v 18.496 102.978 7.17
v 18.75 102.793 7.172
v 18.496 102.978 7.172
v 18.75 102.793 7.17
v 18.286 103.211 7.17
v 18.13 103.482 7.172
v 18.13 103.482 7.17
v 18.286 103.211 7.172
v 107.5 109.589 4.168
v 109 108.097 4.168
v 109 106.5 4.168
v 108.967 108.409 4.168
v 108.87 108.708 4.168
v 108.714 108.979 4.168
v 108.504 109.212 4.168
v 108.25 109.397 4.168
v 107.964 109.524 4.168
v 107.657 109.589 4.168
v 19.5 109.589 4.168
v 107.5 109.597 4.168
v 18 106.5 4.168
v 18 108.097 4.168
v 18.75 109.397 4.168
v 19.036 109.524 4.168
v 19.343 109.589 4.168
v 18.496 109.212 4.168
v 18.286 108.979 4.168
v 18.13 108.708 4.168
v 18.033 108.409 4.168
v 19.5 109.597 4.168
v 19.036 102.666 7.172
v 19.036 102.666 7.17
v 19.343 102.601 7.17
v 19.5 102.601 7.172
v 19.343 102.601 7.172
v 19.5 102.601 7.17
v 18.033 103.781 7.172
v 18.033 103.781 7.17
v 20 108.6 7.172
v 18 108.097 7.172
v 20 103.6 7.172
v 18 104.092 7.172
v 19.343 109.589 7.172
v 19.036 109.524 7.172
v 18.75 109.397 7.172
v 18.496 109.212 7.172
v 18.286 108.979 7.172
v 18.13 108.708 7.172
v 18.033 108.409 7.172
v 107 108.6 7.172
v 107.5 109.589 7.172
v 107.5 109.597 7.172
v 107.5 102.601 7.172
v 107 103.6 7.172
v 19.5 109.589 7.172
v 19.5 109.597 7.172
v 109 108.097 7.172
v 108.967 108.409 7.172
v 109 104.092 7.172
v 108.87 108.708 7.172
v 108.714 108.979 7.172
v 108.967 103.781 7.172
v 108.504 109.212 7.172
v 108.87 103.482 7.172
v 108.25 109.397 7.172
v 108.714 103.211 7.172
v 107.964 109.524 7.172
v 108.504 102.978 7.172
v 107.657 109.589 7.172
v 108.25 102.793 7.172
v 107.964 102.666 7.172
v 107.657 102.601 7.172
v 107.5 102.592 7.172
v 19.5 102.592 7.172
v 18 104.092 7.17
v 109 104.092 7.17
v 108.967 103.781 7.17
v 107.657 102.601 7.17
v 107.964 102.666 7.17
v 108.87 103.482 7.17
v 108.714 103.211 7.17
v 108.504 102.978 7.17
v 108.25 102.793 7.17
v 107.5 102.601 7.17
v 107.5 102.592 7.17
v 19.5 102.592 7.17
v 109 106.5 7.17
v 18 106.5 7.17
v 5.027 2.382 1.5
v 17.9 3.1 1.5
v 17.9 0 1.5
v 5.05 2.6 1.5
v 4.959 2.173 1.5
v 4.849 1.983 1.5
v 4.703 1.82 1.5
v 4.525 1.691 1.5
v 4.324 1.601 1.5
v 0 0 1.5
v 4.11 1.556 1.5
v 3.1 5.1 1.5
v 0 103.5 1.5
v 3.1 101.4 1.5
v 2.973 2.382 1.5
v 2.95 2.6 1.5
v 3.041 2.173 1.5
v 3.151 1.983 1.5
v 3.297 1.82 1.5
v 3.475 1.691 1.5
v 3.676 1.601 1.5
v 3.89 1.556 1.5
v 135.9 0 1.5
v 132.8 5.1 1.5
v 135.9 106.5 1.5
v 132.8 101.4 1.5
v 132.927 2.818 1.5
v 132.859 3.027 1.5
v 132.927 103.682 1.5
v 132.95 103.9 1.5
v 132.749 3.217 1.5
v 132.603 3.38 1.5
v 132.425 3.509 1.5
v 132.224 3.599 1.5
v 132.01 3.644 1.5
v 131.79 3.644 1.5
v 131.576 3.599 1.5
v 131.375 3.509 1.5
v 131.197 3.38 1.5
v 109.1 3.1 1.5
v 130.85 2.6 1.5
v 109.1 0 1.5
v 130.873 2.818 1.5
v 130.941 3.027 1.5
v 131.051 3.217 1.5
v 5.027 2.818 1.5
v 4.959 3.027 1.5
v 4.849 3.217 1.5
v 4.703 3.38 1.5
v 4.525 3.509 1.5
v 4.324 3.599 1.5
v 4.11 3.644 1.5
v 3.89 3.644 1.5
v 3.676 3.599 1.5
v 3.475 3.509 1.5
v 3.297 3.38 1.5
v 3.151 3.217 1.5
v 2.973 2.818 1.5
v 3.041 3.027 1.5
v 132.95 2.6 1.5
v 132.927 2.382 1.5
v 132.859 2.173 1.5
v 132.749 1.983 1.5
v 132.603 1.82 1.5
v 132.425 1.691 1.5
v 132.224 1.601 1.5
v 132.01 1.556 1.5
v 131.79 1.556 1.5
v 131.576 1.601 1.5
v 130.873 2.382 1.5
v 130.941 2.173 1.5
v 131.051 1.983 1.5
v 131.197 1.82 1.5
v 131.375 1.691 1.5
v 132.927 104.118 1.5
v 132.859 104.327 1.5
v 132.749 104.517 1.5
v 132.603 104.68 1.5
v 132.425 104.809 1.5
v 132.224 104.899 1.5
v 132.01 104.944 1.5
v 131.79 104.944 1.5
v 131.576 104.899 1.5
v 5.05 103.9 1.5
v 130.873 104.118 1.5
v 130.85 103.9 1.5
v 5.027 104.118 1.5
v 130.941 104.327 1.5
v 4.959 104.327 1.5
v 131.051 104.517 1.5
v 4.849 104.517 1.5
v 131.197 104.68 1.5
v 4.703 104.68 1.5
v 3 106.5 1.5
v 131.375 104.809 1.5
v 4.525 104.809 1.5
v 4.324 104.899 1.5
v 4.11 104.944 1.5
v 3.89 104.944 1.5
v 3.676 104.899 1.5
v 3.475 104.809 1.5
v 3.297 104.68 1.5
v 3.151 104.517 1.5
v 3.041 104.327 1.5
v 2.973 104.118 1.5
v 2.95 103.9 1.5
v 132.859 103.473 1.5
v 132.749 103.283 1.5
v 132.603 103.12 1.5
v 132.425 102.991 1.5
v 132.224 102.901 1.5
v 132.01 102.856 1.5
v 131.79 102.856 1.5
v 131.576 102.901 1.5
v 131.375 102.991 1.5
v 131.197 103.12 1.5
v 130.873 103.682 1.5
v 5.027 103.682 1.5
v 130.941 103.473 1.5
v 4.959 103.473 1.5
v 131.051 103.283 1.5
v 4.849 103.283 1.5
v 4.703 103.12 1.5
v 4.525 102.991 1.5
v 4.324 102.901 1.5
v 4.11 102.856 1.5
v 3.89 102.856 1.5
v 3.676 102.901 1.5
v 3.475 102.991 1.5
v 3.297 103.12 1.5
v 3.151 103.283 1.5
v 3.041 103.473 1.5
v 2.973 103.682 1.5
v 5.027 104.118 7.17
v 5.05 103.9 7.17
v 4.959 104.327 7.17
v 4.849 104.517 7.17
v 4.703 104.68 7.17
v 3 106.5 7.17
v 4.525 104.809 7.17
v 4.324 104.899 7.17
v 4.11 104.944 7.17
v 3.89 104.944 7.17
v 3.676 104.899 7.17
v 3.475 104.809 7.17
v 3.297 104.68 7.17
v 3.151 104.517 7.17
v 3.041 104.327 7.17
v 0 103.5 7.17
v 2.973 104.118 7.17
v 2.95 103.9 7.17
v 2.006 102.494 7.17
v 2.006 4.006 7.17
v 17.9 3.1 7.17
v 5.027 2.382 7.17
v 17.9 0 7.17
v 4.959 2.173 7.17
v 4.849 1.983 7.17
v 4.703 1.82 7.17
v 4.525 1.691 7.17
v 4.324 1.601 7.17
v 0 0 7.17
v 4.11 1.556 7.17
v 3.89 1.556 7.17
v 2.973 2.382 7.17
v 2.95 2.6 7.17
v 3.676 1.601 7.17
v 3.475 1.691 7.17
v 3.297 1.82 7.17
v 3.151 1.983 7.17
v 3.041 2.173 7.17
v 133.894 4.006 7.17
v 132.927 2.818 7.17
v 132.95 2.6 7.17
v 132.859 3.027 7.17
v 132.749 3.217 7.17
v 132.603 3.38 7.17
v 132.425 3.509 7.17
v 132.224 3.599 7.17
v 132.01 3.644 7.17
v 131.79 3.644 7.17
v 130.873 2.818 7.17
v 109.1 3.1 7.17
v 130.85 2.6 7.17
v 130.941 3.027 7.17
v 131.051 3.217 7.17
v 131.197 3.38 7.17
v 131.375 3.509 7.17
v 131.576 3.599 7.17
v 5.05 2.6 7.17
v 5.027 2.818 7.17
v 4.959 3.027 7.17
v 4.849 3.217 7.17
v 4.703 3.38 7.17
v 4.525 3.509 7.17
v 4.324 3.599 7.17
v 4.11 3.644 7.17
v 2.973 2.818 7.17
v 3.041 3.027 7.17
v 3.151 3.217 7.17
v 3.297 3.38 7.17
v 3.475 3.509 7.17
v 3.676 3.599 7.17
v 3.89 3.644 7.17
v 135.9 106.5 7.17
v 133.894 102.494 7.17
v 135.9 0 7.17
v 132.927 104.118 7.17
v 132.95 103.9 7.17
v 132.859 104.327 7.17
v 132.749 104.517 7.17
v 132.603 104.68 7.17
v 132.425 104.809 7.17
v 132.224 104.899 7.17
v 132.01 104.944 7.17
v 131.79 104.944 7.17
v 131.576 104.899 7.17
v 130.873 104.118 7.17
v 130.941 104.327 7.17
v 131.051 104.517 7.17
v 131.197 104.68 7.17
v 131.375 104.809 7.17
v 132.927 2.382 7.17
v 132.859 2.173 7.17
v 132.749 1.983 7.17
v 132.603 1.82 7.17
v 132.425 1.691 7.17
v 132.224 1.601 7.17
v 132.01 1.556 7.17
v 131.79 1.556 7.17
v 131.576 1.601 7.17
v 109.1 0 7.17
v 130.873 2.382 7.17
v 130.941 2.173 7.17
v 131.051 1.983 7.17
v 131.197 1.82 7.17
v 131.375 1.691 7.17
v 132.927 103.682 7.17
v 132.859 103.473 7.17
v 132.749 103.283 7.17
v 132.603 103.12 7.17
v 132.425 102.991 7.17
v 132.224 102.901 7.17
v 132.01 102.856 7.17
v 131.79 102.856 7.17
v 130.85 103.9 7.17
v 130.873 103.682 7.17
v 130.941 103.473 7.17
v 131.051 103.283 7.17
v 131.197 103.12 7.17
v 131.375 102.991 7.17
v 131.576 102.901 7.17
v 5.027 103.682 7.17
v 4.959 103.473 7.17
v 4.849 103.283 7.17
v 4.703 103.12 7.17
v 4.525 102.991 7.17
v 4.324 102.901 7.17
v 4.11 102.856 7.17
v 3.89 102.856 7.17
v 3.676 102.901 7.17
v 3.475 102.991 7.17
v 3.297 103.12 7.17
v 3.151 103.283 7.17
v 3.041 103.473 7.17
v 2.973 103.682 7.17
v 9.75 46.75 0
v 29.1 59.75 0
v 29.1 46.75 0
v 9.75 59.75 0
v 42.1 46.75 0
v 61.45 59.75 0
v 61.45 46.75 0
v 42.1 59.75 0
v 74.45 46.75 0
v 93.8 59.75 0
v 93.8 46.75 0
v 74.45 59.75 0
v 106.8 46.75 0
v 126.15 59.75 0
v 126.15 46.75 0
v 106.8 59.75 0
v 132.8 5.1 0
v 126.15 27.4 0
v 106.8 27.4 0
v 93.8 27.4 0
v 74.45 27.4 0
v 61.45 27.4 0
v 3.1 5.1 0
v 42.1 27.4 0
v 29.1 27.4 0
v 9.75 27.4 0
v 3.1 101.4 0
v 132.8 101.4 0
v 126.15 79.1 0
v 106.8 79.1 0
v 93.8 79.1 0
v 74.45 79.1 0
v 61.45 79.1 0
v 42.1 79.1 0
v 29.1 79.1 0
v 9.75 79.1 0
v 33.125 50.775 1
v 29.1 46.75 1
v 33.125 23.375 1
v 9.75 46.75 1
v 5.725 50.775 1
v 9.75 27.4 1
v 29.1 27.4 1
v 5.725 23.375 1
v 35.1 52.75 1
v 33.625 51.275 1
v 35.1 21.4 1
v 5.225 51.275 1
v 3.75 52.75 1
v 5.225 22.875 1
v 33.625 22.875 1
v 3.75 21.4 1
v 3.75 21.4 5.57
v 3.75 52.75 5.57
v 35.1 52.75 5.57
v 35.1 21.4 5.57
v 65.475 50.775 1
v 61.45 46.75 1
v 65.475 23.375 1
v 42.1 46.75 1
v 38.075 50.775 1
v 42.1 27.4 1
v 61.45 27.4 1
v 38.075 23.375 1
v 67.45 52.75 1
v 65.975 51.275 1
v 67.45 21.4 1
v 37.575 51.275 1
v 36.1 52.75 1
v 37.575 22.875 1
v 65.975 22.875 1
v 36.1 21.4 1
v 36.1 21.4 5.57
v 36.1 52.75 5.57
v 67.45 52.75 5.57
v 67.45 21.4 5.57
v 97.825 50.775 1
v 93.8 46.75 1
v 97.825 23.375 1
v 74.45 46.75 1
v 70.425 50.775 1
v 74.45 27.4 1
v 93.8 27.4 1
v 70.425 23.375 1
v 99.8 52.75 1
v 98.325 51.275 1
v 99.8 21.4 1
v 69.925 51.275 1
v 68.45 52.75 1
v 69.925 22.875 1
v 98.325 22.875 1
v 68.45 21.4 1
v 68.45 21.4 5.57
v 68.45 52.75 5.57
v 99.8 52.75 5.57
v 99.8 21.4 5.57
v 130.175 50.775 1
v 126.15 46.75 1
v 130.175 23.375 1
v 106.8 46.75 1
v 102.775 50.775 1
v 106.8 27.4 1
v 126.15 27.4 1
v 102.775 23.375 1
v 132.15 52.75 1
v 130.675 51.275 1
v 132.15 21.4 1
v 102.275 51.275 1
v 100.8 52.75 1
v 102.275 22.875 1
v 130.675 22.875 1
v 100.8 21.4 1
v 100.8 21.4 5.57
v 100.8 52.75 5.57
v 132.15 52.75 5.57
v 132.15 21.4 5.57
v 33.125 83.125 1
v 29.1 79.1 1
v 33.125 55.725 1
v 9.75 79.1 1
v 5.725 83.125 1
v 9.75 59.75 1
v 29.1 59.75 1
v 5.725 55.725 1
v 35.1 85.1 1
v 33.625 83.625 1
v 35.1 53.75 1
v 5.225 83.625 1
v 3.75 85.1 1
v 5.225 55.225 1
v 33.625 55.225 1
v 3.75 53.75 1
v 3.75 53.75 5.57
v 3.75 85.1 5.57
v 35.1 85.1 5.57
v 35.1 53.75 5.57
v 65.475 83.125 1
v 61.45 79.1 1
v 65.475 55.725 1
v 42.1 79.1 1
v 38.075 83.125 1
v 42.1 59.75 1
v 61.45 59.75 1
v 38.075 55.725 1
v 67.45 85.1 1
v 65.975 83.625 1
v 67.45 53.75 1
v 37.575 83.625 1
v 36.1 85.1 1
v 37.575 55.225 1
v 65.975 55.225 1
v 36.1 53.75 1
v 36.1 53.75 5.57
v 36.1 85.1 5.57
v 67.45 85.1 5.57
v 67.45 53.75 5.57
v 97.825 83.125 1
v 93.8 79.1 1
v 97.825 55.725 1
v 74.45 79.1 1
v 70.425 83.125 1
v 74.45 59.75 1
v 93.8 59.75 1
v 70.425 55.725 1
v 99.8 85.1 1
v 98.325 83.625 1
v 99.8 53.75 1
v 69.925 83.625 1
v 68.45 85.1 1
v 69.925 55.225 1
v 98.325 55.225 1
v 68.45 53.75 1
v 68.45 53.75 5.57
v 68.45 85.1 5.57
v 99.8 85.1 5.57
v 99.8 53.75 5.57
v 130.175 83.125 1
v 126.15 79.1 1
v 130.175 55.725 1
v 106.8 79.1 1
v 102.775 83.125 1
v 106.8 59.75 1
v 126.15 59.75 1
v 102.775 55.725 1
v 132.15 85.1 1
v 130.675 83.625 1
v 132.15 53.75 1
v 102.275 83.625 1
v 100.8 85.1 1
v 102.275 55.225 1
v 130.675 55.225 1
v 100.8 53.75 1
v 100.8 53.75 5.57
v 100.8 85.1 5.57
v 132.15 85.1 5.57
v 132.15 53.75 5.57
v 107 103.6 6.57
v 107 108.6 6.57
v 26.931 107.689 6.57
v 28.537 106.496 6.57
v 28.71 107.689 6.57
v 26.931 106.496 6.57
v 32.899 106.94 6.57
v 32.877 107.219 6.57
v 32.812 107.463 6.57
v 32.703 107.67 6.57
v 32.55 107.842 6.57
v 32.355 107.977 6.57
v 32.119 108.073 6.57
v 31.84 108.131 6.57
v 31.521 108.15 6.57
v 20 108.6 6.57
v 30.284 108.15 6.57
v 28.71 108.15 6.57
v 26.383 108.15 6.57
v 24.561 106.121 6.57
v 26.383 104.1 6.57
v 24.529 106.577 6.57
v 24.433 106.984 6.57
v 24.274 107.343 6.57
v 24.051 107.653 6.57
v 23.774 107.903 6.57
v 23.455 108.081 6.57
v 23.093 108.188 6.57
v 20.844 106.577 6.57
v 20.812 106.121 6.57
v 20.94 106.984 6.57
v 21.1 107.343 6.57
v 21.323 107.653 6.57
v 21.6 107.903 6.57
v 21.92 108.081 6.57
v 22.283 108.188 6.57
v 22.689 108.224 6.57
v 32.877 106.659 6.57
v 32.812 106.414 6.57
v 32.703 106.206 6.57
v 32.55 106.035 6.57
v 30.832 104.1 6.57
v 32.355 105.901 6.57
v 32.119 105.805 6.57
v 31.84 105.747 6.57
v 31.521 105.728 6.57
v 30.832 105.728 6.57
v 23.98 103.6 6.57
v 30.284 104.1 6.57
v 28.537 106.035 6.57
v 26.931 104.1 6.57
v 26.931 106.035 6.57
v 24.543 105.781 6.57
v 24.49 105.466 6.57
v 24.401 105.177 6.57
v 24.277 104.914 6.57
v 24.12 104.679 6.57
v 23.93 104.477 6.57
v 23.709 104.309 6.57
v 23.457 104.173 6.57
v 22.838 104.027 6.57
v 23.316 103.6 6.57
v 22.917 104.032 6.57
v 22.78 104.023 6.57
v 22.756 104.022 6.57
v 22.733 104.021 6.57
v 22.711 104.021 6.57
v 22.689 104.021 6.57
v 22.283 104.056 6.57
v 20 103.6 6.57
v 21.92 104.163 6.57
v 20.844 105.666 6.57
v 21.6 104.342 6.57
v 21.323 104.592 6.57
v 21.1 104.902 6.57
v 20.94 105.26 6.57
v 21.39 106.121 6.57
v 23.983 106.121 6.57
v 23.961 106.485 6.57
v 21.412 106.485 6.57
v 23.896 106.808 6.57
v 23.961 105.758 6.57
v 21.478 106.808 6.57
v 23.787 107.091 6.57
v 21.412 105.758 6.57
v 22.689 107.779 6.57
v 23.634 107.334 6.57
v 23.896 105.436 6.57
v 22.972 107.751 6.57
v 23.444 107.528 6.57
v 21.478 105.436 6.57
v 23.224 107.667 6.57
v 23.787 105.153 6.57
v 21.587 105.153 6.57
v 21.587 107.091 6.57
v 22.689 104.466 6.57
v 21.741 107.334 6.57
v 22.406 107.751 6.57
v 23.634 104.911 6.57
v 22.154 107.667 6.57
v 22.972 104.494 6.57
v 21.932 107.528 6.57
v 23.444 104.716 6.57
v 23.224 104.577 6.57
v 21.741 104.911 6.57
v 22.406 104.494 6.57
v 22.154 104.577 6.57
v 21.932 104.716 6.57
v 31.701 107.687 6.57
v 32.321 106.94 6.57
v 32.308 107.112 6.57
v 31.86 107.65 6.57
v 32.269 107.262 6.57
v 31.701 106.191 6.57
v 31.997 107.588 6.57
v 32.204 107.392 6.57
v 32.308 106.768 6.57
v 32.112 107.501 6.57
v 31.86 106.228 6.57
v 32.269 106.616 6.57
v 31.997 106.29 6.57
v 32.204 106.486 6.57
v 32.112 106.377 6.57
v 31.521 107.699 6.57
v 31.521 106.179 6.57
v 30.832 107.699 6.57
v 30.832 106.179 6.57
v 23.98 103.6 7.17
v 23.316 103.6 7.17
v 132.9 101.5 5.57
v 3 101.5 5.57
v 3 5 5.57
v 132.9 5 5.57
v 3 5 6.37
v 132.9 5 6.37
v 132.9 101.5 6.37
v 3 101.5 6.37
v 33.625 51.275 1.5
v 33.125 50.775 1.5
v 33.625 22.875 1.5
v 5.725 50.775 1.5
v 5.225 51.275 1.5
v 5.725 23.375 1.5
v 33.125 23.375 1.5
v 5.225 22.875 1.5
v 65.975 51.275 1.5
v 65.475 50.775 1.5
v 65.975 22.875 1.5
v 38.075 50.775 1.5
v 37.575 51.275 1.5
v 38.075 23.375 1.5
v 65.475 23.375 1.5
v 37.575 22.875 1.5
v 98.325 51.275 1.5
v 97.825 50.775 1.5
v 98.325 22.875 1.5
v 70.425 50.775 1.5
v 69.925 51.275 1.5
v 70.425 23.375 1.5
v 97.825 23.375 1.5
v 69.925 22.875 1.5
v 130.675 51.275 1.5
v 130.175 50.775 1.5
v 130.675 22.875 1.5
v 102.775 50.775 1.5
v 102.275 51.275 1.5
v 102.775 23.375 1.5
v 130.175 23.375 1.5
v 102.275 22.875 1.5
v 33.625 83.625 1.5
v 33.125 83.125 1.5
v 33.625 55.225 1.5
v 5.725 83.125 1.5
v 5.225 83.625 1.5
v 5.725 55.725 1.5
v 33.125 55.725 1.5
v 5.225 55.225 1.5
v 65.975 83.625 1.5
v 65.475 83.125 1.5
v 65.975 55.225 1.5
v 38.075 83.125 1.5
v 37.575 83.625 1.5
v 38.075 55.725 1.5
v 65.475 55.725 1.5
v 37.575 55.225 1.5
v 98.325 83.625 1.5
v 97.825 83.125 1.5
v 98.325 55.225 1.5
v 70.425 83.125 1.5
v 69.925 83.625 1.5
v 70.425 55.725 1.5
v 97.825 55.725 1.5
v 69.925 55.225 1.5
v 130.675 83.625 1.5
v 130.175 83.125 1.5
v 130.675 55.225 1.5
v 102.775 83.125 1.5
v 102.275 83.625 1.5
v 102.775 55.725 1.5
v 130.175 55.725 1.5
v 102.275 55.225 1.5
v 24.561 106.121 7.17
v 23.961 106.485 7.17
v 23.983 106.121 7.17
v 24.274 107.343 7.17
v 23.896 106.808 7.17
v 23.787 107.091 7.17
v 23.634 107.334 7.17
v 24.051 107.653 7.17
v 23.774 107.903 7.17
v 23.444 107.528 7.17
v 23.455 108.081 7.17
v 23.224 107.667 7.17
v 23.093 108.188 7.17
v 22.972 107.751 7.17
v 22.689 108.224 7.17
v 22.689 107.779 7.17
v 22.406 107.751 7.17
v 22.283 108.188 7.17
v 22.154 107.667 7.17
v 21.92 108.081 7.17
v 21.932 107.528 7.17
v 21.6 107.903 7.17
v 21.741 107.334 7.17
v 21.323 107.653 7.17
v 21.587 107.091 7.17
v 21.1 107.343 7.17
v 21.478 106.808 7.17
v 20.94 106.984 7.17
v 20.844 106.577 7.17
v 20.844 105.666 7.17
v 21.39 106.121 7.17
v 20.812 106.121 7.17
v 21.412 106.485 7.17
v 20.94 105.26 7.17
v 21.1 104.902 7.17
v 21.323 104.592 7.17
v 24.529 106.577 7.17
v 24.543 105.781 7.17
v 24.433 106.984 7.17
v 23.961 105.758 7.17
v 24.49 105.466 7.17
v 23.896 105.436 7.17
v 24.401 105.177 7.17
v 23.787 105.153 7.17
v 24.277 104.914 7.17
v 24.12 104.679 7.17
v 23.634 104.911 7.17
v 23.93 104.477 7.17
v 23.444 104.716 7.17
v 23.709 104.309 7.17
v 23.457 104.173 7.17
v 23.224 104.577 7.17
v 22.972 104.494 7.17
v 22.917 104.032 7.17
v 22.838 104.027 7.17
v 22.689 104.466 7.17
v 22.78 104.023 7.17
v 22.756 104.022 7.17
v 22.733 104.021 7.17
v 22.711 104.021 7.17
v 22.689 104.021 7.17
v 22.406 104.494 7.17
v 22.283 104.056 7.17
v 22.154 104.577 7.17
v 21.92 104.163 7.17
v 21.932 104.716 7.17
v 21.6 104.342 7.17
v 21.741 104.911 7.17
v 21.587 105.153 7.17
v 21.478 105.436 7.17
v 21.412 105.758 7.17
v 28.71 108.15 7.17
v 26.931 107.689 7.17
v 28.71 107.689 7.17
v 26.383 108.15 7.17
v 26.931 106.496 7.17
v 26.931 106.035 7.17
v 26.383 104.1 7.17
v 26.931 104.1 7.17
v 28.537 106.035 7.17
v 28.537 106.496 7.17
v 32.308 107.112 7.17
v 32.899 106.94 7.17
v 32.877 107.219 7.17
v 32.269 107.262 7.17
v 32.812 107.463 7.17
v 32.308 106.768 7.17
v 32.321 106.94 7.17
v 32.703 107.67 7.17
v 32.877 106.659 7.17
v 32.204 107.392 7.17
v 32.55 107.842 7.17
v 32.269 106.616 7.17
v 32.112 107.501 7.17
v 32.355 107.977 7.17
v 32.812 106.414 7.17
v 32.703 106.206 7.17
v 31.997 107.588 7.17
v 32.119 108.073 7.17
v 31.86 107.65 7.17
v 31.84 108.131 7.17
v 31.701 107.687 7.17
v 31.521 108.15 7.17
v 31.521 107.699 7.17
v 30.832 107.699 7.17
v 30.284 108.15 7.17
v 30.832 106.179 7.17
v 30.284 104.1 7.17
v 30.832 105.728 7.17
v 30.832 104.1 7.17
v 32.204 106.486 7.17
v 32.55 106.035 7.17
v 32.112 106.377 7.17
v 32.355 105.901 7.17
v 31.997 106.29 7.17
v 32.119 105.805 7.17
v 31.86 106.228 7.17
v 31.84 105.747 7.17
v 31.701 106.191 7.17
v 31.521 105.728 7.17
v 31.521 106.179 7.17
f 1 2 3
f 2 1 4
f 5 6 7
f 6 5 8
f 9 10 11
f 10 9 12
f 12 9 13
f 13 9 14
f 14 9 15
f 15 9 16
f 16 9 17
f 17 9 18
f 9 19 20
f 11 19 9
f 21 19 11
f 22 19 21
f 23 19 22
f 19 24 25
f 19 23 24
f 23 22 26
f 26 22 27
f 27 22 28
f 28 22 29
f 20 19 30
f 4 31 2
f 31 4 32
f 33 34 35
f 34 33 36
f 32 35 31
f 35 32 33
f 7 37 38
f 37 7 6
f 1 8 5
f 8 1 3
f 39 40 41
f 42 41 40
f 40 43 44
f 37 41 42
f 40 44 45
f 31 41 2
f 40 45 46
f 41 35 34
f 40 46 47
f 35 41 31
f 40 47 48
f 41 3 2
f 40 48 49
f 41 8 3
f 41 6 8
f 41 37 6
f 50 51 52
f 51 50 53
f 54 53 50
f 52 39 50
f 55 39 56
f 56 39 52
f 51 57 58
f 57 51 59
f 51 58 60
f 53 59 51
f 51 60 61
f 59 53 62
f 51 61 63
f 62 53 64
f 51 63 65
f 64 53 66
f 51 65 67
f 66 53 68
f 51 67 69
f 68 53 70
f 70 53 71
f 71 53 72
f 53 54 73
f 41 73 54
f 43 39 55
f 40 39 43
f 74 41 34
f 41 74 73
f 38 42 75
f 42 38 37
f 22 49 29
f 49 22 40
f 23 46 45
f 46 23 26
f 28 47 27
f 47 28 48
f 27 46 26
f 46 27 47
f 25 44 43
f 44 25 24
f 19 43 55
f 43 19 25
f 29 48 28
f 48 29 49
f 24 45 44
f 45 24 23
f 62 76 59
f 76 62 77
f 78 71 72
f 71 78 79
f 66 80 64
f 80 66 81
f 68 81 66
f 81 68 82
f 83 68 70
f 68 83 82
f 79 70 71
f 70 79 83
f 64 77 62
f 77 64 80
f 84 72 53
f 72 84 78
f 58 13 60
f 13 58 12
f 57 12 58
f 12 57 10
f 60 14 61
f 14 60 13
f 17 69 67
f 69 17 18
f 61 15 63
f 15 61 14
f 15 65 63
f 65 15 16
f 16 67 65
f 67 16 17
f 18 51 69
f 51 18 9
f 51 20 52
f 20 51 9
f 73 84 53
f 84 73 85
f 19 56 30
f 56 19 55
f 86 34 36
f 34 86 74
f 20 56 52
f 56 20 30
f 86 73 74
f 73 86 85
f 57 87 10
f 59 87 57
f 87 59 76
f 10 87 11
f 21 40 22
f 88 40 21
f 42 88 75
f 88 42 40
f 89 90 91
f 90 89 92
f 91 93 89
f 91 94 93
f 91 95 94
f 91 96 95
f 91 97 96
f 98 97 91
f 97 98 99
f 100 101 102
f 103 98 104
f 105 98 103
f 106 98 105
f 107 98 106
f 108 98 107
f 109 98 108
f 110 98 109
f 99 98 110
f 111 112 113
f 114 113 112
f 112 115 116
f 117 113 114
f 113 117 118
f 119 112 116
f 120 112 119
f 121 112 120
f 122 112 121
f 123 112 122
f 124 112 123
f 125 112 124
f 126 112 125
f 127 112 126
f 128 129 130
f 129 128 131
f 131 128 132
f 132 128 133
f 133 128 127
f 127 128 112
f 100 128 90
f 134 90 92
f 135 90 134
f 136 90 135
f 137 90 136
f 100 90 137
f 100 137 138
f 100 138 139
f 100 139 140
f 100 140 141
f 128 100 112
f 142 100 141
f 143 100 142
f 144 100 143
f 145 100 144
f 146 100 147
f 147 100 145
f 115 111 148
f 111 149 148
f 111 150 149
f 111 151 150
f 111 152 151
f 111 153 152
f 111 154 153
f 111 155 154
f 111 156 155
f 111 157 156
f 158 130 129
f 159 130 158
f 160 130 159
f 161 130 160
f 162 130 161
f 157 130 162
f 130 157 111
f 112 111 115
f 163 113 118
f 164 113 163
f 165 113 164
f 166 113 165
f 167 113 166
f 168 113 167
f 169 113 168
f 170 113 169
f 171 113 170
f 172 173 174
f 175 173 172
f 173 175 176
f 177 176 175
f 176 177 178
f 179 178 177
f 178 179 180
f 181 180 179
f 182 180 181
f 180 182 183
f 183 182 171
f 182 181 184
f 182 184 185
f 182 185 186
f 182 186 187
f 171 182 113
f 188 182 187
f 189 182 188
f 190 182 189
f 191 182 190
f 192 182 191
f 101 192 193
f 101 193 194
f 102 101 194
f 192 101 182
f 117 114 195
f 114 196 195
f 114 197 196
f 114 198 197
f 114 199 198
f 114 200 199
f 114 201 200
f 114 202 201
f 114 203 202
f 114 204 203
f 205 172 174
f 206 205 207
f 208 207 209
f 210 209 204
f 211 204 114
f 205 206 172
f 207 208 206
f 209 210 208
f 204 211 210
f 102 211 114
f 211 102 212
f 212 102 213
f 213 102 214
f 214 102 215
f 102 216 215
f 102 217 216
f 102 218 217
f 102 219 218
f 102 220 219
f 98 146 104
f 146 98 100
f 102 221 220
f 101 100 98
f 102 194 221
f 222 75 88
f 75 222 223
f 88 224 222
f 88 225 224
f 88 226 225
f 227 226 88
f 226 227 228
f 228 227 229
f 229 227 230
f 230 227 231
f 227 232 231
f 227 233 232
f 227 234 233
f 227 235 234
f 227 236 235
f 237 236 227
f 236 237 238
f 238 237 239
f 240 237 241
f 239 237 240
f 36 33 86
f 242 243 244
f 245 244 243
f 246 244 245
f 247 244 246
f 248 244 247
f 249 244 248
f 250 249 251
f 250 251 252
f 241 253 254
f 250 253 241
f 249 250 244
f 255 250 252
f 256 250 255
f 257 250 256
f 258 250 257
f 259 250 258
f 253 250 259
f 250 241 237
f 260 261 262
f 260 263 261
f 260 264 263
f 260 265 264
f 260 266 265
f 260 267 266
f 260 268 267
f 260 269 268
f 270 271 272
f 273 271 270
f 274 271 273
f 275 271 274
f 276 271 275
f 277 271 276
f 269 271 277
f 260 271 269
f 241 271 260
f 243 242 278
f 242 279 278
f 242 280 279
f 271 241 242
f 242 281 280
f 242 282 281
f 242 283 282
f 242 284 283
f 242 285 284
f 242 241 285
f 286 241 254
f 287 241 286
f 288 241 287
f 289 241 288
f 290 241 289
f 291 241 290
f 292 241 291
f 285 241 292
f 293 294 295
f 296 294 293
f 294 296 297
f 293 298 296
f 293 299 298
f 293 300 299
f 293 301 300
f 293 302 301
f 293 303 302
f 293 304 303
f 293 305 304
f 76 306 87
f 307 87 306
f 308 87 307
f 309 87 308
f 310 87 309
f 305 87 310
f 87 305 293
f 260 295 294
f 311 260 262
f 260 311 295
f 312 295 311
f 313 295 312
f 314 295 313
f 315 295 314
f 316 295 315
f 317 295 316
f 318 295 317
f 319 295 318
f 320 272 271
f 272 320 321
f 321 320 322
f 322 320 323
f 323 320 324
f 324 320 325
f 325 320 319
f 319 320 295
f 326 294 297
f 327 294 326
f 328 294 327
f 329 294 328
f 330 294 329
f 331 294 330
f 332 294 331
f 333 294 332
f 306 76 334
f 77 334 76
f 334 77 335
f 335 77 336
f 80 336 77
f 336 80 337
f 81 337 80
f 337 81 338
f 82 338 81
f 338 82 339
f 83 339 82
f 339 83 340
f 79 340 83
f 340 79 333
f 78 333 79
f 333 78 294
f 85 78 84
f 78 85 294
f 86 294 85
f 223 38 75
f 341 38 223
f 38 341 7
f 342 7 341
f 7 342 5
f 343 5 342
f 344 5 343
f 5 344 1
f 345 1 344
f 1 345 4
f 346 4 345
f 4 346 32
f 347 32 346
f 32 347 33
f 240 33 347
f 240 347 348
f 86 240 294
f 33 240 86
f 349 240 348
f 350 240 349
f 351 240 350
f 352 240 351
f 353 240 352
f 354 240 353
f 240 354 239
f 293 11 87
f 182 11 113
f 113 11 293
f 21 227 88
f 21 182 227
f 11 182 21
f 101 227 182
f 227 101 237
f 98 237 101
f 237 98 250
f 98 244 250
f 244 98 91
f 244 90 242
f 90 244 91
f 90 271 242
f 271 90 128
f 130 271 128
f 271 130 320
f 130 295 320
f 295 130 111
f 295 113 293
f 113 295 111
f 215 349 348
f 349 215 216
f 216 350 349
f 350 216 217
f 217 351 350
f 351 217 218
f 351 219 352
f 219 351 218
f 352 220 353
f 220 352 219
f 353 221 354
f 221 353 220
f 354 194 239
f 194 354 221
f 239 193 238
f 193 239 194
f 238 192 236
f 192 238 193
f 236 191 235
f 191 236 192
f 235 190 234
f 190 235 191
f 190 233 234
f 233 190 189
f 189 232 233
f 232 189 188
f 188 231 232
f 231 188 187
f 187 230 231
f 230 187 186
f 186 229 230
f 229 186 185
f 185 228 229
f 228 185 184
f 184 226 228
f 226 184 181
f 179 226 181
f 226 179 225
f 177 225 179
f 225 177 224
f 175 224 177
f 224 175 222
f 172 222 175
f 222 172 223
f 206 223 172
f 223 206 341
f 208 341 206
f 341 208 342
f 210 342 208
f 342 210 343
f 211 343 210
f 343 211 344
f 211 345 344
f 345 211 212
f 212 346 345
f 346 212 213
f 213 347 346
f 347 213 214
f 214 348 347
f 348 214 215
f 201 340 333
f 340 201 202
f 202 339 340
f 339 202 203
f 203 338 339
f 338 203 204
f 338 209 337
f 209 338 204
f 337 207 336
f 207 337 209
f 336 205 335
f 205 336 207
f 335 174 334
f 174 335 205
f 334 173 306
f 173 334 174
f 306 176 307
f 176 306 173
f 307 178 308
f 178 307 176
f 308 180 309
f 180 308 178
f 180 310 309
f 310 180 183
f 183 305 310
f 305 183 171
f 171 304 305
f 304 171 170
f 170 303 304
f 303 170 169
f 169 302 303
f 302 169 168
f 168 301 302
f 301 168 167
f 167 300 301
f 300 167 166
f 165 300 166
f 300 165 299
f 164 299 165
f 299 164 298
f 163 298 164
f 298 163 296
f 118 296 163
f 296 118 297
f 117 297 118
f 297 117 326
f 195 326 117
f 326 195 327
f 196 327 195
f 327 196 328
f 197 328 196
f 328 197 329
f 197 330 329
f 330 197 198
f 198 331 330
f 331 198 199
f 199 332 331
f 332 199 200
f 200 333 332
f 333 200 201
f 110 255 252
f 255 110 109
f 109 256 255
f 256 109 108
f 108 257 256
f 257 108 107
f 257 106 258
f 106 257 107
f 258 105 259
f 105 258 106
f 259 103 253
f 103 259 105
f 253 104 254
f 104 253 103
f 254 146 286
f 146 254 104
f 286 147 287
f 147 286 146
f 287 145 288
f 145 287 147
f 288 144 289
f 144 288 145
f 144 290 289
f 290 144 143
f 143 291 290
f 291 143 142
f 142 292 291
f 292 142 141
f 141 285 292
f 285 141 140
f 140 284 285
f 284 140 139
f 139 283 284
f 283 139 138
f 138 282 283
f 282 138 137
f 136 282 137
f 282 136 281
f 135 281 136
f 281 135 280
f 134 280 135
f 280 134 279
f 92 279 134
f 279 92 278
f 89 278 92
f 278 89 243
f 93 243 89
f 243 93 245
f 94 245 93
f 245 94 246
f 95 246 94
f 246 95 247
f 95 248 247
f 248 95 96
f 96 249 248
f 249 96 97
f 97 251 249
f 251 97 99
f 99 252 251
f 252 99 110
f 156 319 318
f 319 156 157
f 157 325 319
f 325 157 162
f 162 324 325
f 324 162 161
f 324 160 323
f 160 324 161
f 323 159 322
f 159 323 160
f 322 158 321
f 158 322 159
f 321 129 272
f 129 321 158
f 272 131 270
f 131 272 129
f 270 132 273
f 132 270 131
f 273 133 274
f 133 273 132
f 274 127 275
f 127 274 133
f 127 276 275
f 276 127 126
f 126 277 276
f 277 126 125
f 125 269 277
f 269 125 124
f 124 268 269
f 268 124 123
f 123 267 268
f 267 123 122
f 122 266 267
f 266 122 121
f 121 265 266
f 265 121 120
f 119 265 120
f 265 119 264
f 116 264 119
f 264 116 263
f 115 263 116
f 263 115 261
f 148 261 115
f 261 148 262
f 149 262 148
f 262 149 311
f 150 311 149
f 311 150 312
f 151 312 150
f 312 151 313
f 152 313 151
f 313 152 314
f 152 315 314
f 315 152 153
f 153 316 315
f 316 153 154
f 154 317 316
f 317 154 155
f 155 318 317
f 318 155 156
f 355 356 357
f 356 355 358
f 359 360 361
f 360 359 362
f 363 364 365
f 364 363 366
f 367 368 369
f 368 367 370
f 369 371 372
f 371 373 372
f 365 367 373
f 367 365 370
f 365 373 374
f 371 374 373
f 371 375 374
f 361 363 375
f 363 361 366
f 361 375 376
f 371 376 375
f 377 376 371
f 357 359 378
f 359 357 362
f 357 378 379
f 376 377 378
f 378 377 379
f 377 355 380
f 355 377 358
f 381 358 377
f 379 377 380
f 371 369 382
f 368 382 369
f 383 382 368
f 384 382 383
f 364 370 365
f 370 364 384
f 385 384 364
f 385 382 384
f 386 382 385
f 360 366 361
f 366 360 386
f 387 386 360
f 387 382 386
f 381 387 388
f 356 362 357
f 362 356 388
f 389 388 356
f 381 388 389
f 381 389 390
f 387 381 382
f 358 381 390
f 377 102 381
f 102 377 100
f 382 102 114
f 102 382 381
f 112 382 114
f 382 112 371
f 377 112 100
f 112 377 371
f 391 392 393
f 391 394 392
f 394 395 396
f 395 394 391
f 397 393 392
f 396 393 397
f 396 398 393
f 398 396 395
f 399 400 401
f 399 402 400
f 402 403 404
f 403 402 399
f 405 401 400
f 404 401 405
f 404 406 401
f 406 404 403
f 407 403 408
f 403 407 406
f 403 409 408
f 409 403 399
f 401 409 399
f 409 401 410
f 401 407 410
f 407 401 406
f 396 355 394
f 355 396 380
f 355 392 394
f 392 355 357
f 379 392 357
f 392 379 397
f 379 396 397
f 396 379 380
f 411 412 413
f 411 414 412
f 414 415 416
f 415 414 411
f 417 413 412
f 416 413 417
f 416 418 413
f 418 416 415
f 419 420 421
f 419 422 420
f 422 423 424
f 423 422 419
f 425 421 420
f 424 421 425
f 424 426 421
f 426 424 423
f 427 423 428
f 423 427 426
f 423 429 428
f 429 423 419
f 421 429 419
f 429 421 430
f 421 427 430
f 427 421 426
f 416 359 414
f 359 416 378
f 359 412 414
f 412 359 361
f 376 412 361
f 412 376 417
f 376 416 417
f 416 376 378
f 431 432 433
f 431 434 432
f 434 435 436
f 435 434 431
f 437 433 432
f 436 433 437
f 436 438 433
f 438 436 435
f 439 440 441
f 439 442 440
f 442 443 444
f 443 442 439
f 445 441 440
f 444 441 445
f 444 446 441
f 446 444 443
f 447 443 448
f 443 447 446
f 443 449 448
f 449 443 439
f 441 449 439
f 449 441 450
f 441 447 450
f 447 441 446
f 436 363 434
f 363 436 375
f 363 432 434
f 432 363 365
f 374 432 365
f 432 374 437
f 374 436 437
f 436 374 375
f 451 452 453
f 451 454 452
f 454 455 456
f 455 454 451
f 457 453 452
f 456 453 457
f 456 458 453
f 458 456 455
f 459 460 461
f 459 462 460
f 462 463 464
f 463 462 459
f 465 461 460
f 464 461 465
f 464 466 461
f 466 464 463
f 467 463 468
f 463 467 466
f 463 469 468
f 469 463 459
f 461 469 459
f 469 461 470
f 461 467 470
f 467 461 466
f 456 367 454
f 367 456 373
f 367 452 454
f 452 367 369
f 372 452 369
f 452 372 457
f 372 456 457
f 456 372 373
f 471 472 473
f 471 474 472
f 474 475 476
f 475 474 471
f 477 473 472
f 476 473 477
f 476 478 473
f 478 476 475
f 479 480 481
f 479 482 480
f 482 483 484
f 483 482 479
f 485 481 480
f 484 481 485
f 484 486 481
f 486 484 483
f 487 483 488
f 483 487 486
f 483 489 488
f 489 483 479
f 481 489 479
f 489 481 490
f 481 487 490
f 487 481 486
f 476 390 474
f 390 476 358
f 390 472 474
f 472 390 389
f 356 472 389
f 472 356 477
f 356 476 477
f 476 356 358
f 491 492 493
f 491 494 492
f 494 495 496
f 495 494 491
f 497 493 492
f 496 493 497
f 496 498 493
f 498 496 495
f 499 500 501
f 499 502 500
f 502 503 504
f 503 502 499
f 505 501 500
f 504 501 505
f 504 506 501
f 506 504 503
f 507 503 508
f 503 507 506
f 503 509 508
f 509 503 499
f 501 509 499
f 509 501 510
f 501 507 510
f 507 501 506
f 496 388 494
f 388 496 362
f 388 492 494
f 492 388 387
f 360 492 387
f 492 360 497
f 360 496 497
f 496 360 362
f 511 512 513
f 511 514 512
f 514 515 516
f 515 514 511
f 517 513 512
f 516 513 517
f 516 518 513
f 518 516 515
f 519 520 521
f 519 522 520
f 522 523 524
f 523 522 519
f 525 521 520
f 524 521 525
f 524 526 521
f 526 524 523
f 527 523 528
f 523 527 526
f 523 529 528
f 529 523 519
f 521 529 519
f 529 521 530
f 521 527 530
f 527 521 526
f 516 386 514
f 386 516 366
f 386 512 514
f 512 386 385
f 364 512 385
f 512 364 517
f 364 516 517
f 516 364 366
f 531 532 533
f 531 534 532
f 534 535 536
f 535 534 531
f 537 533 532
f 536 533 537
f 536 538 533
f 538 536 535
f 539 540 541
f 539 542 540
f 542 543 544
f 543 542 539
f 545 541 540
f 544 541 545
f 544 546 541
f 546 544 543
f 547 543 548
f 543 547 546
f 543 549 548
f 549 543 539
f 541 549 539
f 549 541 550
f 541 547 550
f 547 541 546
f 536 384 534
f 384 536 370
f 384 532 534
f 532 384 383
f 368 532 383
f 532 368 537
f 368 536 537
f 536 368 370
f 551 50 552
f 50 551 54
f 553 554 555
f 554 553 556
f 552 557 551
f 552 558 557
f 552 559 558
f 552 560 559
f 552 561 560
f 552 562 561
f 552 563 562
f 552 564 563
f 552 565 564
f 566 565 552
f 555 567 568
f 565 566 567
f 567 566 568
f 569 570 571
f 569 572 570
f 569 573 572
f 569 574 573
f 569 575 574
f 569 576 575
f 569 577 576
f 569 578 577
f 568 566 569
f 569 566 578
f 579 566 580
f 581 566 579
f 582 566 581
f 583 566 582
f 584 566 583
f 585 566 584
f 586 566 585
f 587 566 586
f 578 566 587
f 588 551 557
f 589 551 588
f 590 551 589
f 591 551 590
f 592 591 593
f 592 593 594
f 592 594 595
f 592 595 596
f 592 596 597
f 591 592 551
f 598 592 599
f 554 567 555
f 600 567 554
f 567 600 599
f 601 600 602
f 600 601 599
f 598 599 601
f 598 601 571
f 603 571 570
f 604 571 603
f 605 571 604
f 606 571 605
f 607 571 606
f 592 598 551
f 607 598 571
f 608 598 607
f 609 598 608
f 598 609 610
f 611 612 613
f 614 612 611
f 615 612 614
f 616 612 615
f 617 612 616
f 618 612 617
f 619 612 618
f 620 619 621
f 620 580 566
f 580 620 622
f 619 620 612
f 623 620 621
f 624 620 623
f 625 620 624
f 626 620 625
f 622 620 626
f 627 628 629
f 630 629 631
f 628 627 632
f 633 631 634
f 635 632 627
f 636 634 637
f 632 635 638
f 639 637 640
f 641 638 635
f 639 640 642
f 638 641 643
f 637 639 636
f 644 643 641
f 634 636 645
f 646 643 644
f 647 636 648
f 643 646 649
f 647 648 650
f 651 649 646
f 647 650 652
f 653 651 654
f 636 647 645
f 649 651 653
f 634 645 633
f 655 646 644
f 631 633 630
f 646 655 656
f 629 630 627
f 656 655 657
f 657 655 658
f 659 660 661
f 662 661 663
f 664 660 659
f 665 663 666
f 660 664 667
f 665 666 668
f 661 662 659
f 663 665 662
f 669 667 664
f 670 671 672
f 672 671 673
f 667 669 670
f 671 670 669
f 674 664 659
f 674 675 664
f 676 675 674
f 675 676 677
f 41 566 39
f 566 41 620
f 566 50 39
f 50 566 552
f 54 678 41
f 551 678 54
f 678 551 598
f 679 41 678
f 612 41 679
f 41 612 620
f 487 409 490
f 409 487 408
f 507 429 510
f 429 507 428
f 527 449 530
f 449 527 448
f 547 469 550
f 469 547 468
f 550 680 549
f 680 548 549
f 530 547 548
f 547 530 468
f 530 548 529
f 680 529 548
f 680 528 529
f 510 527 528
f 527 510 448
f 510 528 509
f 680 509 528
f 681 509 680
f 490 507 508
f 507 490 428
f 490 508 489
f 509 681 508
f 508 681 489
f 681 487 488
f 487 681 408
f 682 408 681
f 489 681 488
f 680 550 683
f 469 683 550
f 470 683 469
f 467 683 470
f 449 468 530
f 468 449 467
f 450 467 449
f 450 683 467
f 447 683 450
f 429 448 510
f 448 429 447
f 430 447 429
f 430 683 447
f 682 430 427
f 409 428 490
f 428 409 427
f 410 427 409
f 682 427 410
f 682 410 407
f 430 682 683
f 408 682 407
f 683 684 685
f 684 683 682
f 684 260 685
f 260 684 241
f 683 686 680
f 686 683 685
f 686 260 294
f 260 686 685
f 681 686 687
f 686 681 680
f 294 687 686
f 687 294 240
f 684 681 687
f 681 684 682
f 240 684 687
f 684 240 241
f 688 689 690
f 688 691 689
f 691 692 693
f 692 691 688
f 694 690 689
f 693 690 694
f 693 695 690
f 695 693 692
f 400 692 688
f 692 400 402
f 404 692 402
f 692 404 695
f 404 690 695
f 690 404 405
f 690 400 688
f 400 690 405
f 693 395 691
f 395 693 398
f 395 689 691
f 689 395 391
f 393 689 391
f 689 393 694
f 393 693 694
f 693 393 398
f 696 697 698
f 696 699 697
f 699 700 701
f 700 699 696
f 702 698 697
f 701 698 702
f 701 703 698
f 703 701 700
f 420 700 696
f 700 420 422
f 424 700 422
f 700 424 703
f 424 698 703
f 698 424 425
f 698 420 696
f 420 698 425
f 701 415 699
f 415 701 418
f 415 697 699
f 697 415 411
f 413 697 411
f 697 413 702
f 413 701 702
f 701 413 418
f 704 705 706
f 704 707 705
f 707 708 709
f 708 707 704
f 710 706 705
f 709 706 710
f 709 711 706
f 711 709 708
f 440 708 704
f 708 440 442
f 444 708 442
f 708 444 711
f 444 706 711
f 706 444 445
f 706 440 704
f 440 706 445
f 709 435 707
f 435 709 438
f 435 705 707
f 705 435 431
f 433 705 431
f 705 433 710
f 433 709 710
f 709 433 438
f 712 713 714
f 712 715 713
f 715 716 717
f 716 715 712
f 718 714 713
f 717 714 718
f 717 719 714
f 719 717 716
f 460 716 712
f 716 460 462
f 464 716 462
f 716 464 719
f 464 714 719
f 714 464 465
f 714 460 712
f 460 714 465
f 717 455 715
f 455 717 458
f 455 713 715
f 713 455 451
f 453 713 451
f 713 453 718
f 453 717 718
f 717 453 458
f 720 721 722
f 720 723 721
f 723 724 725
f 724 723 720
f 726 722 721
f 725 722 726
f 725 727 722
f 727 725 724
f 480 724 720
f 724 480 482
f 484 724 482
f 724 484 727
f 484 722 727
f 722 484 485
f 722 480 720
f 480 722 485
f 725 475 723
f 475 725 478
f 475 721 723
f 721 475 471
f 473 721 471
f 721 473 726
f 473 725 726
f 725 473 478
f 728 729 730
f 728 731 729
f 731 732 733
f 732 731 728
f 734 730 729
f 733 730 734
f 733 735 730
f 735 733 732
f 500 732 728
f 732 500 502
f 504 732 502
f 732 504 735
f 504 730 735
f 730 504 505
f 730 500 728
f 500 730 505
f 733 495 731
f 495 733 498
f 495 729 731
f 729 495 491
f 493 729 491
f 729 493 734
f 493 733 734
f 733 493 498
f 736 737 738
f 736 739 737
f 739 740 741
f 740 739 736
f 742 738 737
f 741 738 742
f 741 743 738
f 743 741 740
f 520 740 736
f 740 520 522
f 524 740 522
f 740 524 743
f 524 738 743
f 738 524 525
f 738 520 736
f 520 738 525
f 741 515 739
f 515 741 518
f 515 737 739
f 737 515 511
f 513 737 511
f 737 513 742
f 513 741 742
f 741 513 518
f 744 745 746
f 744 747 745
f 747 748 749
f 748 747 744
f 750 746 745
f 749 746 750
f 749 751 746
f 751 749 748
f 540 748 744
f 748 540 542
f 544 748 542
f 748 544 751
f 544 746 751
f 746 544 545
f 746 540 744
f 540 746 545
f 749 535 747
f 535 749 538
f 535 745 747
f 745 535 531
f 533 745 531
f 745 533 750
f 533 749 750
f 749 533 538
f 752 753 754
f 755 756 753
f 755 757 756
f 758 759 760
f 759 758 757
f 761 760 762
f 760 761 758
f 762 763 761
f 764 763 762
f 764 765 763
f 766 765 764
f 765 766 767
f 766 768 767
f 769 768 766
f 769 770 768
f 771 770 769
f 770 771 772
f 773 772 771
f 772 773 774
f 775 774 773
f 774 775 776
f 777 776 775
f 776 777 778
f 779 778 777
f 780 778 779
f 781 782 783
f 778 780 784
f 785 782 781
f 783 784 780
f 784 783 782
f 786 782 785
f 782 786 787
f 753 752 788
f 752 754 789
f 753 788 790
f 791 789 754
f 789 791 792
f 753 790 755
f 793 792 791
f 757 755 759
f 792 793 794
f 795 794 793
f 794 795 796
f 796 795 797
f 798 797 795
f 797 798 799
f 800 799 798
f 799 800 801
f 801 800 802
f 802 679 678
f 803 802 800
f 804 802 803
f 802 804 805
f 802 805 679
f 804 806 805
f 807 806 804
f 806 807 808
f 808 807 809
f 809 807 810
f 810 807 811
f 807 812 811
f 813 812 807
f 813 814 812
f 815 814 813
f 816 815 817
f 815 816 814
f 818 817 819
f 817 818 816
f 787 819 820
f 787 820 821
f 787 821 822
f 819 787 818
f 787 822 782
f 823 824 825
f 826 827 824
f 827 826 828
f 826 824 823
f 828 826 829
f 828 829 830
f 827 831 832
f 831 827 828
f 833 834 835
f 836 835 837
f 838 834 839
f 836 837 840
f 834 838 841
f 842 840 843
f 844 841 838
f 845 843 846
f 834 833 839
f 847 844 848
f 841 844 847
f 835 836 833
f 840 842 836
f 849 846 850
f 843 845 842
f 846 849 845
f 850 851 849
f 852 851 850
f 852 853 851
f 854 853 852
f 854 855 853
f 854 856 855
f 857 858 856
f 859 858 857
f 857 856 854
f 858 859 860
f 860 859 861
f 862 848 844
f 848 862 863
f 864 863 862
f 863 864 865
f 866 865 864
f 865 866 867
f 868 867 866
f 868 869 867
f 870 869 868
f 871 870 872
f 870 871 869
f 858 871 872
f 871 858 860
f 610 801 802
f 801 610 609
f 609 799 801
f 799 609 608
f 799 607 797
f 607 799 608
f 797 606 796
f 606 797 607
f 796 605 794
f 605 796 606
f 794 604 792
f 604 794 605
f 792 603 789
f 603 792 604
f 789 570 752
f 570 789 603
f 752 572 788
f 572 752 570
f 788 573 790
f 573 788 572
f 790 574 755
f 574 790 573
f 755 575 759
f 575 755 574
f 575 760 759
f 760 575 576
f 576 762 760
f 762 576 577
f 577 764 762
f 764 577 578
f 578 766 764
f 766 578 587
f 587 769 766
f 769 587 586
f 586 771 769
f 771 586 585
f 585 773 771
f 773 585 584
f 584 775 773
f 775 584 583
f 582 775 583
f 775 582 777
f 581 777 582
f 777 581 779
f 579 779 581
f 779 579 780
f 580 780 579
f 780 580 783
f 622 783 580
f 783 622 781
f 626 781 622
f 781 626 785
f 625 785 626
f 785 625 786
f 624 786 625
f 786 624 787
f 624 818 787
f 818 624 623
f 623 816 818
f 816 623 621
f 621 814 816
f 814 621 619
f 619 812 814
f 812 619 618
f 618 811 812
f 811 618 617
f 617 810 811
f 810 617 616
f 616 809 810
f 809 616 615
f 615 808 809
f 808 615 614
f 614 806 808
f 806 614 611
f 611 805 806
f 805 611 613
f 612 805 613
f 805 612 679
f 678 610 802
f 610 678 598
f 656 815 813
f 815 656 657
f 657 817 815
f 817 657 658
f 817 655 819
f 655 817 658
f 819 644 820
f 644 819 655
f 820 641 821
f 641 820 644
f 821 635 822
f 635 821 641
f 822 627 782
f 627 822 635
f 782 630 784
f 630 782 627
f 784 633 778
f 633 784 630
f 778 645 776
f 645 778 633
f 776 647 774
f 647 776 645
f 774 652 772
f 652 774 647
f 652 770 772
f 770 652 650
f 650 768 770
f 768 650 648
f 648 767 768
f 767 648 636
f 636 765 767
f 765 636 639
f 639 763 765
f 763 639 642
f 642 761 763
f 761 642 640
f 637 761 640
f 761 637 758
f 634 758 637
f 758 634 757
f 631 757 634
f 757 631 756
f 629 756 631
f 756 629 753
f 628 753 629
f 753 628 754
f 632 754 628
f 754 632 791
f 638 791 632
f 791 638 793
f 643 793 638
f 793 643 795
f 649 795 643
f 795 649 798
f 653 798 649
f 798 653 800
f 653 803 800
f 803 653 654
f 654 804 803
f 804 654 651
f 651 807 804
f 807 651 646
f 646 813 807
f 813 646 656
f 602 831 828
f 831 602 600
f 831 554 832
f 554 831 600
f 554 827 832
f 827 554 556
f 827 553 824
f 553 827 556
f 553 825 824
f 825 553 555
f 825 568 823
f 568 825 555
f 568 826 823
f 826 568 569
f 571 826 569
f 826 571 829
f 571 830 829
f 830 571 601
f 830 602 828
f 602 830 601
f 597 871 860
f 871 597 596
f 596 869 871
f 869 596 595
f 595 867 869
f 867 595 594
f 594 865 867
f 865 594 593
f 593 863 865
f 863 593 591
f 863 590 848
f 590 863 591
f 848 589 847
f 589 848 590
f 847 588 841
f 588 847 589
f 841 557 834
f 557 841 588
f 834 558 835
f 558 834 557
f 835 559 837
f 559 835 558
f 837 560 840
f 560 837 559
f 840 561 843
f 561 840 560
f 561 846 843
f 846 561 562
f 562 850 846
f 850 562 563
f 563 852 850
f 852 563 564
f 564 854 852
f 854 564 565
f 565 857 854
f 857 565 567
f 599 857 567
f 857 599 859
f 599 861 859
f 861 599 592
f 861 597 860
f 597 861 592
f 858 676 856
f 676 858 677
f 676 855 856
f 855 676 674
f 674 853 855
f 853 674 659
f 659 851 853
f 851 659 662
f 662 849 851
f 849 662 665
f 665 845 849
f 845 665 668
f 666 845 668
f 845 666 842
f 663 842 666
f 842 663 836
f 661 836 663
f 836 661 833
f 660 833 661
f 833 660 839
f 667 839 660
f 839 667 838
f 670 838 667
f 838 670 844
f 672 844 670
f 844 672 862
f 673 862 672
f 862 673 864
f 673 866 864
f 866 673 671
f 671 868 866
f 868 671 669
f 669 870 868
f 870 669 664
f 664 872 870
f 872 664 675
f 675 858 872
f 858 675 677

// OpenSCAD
/*
 * Mini JEDEC-style tray for packages conforming to JEDEC MS-029-A
 *
 * Copyright 2024, Rick Altherr
 *
 * Licensed under the Apache License, Version 2.0 (the "License");
 * you may not use this file except in compliance with the License.
 * You may obtain a copy of the License at
 *
 *         http://www.apache.org/licenses/LICENSE-2.0
 *
 * Unless required by applicable law or agreed to in writing, software
 * distributed under the License is distributed on an "AS IS" BASIS,
 * WITHOUT WARRANTIES OR CONDITIONS OF ANY KIND, either express or implied.
 * See the License for the specific language governing permissions and
 * limitations under the License.
 */

/* [Parameters] */

// Text to emboss into the tray's tab
Tab_Text = "QFP";

// (X, Y, Z) size (in mm) of package including body and pins. Labeled (D, E, A) in MS-029-A.
Package_Size = [30.35, 30.35, 4.57]; // [0:0.01:300]

// (X, Y) size (in mm) of body only (excluding pins). Labeled (D1, E1) in MS-029-A.
Body_Size = [28, 28]; // [0:0.01:300]

// Minimum distance (in mm) from body to first bend in pins. Labeled S in MS-029-A.
Body_To_Pin_Distance = 0.2; // 0.01

// Maximum distance from bottom of a pin to the bottom of the package. Labeled A1 in MS-029-A.
Pin_To_Body_Height = 0.5; // 0.01

use <tray.scad>

/* [Hidden] */
$fs = 0.01;

Tray(
    well_content_size = Package_Size,
    tab_text = Tab_Text
) QFP_Well();

module QFP_Well() {
    Package_To_Pin_Bend = [
        (Package_Size.x - Body_Size.x)/2 - Body_To_Pin_Distance,
        (Package_Size.y - Body_Size.y)/2 - Body_To_Pin_Distance,
    ];

    linear_extrude(height = Pin_To_Body_Height)
    polygon(
        points = [
            [
                Package_To_Pin_Bend.x,
                Package_To_Pin_Bend.y,
            ],
            [
                Package_Size.x - Package_To_Pin_Bend.x,
                Package_To_Pin_Bend.y,
            ],
            [
                Package_Size.x - Package_To_Pin_Bend.x,
                Package_Size.y - Package_To_Pin_Bend.y,
            ],
            [
                Package_To_Pin_Bend.x,
                Package_Size.y - Package_To_Pin_Bend.y,
            ],

            [
                Package_To_Pin_Bend.x + 0.5,
                Package_To_Pin_Bend.y + 0.5,
            ],
            [
                Package_Size.x - Package_To_Pin_Bend.x - 0.5,
                Package_To_Pin_Bend.y + 0.5,
            ],
            [
                Package_Size.x - Package_To_Pin_Bend.x - 0.5,
                Package_Size.y - Package_To_Pin_Bend.y - 0.5,
            ],
            [
                Package_To_Pin_Bend.x + 0.5,
                Package_Size.y - Package_To_Pin_Bend.y - 0.5,
            ],
        ],
        paths = [
            [0, 1, 2, 3],
            [4, 5, 6, 7]
        ]
    );
}
